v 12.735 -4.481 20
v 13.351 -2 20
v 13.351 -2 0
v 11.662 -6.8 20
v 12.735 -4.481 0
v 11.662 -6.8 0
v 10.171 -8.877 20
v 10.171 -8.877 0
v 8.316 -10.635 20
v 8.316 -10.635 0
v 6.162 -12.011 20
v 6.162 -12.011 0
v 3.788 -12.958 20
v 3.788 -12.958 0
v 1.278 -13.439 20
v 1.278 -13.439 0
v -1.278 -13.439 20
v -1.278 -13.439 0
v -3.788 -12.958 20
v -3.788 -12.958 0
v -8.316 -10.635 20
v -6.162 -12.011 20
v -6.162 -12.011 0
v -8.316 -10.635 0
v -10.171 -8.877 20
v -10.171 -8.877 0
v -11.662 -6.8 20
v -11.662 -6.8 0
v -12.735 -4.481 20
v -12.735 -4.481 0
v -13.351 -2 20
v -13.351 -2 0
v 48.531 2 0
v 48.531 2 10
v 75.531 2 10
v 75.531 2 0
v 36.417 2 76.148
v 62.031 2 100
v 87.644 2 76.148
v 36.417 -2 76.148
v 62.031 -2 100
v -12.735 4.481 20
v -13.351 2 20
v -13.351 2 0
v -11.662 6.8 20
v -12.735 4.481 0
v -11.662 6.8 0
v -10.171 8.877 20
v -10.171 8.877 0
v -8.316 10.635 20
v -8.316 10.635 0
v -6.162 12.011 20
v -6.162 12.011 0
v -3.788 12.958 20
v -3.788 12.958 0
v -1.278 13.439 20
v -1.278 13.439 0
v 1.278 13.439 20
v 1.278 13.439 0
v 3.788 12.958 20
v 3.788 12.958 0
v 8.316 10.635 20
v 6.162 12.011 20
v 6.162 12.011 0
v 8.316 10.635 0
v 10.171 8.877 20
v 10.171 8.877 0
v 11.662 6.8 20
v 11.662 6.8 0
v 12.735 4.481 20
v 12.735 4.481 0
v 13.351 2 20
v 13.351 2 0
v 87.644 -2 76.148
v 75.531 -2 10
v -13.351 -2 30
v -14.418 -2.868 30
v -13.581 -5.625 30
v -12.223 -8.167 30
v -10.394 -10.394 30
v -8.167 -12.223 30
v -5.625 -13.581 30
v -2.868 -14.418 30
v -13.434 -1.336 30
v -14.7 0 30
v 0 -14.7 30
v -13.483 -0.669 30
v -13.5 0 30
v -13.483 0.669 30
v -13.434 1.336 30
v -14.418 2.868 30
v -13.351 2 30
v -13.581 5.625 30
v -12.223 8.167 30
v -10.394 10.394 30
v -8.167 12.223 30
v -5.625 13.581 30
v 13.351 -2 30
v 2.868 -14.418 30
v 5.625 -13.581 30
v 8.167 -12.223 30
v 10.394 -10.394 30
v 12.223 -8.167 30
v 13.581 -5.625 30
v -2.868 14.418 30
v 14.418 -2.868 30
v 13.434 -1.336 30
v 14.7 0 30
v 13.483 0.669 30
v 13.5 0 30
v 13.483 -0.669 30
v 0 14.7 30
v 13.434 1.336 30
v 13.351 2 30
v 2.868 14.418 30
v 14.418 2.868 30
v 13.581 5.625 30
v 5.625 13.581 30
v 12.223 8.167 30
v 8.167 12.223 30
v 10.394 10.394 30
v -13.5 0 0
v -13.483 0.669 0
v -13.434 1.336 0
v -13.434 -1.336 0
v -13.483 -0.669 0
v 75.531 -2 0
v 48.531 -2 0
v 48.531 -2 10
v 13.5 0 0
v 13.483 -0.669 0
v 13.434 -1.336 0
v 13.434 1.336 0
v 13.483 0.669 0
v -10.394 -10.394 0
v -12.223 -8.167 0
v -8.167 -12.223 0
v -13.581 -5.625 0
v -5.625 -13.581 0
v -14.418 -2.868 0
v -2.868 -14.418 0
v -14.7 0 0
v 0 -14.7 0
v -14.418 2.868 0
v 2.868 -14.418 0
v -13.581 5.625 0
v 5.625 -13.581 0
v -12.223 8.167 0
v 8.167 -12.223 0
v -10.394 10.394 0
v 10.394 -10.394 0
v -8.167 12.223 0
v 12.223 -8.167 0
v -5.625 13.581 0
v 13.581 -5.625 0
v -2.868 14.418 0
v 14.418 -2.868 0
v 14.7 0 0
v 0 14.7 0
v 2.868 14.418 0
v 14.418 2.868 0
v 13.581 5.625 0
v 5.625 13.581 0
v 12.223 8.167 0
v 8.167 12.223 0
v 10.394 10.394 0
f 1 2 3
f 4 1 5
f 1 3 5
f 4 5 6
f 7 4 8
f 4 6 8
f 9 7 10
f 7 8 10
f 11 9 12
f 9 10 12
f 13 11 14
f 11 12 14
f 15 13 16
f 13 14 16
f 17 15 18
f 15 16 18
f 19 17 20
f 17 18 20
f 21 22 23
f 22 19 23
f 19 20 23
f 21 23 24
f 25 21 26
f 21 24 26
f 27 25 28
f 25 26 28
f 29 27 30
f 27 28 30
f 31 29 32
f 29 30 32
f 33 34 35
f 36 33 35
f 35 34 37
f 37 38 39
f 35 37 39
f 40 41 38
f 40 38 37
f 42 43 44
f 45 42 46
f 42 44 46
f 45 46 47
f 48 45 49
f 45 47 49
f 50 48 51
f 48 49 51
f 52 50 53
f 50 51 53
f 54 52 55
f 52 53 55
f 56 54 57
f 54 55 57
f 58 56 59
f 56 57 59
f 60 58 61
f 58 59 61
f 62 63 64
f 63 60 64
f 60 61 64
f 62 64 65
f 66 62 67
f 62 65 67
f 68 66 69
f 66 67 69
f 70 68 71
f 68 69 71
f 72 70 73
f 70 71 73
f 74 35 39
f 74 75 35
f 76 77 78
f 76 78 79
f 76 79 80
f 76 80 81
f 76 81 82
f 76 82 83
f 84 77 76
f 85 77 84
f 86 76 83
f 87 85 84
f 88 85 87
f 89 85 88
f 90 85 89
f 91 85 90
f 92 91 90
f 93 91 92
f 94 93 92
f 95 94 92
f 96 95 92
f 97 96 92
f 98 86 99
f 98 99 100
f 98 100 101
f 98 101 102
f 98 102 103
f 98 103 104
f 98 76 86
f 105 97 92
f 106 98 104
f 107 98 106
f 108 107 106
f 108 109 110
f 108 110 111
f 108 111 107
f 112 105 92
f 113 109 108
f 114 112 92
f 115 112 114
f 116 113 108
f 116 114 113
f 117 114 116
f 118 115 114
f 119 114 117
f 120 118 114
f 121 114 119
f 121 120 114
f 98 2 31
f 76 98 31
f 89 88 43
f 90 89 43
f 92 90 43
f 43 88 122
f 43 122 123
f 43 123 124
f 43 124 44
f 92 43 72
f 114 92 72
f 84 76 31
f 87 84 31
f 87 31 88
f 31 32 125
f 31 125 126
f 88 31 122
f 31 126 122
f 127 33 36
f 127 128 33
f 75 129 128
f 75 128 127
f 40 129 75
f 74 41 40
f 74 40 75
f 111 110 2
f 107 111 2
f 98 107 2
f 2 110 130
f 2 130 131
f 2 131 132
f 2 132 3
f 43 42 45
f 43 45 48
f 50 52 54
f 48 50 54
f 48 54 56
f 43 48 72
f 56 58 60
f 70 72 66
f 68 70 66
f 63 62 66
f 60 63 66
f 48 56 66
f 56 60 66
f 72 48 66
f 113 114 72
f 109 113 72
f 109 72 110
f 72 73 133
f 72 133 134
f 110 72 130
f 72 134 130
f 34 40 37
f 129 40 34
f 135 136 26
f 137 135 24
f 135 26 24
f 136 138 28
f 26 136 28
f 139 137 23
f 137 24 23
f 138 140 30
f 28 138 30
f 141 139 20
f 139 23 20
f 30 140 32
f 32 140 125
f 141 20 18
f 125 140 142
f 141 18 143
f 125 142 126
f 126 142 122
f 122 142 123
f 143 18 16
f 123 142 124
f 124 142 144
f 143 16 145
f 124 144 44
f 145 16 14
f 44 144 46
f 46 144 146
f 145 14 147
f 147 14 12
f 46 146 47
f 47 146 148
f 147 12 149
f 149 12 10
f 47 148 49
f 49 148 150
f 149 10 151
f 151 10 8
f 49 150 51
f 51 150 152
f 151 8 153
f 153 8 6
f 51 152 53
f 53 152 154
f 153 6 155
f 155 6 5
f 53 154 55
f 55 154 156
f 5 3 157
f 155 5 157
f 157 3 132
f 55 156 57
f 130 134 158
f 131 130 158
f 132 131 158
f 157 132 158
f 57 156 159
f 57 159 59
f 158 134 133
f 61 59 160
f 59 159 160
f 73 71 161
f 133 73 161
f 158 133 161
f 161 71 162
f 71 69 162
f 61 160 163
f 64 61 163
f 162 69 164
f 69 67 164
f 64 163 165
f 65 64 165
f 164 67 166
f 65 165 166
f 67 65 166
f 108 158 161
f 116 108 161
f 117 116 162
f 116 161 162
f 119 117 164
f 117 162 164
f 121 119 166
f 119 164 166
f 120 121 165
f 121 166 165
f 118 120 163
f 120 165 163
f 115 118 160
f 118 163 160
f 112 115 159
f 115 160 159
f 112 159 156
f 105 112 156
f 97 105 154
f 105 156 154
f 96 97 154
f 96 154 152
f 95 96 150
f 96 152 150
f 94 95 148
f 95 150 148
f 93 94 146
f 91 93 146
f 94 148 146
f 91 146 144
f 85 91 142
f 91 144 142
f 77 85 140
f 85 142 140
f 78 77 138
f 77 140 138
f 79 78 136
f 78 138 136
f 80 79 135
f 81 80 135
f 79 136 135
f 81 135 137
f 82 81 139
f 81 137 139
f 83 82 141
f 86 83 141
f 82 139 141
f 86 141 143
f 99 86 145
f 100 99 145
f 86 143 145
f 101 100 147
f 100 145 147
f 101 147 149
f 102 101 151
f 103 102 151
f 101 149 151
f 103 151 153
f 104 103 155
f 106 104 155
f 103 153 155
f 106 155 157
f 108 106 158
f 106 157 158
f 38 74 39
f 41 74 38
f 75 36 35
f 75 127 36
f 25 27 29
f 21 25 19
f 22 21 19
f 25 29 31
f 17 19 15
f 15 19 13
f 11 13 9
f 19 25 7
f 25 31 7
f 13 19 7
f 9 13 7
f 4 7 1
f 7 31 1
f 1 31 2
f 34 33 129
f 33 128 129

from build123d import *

# Parameters (mm, degrees)
F0_R          = 14.7
F1_DEPTH      = 30
F2_START      = 20
F2_DEPTH      = 10
F3_W          = 13.5
F3_H          = 10
F4_DEPTH      = 2
F4_DEPTH_BACK = 2


with BuildPart() as f1:
    # F0 (on Top) → F1 (new body)
    with BuildSketch(Plane.XY):
        Circle(F0_R)
        with BuildLine():
            ThreePointArc((13.3510299228, 2), (13.4627059679, 1.0027701736), (13.5, 0))
            ThreePointArc((13.5, 0), (13.4627059679, -1.0027701736), (13.3510299228, -2))
            ThreePointArc((13.3510299228, -2), (0, -13.5), (-13.3510299228, -2))
            ThreePointArc((-13.3510299228, -2), (-13.4627059679, -1.0027701736), (-13.5, 0))
            ThreePointArc((-13.5, 0), (-13.4627059679, 1.0027701736), (-13.3510299228, 2))
            ThreePointArc((-13.3510299228, 2), (0, 13.5), (13.3510299228, 2))
        make_face(mode=Mode.SUBTRACT)
    extrude(amount=F1_DEPTH)

    # F0 (on Top) → F2 (join)
    with BuildSketch(Plane.XY.offset(F2_START)):
        with BuildLine():
            Line((-13.3510299228, 2), (13.3510299228, 2))
            ThreePointArc((13.3510299228, 2), (0, 13.5), (-13.3510299228, 2))
        make_face()
        with BuildLine():
            ThreePointArc((-13.3510299228, -2), (0, -13.5), (13.3510299228, -2))
            Line((13.3510299228, -2), (-13.3510299228, -2))
        make_face()
    extrude(amount=F2_DEPTH)


with BuildPart() as f4:
    # F3 (on Front) → F4 (new body, two sides)
    with BuildSketch(Plane.XZ) as f4_sk:
        Polygon((62.0305935144, 10), (75.5305935144, 10), (87.6443634541, 76.1476460391), (62.0305935144, 100), align=None)
        Polygon((48.5305935144, 10), (62.0305935144, 10), (62.0305935144, 100), (36.4168235748, 76.1476460391), align=None)
        with Locations((55.2805935144, 5)):
            Rectangle(F3_W, F3_H)
        with Locations((68.7805935144, 5)):
            Rectangle(F3_W, F3_H)
    extrude(amount=F4_DEPTH)
    extrude(f4_sk.sketch, amount=-F4_DEPTH_BACK)


solid = Compound([f1.part, f4.part])
